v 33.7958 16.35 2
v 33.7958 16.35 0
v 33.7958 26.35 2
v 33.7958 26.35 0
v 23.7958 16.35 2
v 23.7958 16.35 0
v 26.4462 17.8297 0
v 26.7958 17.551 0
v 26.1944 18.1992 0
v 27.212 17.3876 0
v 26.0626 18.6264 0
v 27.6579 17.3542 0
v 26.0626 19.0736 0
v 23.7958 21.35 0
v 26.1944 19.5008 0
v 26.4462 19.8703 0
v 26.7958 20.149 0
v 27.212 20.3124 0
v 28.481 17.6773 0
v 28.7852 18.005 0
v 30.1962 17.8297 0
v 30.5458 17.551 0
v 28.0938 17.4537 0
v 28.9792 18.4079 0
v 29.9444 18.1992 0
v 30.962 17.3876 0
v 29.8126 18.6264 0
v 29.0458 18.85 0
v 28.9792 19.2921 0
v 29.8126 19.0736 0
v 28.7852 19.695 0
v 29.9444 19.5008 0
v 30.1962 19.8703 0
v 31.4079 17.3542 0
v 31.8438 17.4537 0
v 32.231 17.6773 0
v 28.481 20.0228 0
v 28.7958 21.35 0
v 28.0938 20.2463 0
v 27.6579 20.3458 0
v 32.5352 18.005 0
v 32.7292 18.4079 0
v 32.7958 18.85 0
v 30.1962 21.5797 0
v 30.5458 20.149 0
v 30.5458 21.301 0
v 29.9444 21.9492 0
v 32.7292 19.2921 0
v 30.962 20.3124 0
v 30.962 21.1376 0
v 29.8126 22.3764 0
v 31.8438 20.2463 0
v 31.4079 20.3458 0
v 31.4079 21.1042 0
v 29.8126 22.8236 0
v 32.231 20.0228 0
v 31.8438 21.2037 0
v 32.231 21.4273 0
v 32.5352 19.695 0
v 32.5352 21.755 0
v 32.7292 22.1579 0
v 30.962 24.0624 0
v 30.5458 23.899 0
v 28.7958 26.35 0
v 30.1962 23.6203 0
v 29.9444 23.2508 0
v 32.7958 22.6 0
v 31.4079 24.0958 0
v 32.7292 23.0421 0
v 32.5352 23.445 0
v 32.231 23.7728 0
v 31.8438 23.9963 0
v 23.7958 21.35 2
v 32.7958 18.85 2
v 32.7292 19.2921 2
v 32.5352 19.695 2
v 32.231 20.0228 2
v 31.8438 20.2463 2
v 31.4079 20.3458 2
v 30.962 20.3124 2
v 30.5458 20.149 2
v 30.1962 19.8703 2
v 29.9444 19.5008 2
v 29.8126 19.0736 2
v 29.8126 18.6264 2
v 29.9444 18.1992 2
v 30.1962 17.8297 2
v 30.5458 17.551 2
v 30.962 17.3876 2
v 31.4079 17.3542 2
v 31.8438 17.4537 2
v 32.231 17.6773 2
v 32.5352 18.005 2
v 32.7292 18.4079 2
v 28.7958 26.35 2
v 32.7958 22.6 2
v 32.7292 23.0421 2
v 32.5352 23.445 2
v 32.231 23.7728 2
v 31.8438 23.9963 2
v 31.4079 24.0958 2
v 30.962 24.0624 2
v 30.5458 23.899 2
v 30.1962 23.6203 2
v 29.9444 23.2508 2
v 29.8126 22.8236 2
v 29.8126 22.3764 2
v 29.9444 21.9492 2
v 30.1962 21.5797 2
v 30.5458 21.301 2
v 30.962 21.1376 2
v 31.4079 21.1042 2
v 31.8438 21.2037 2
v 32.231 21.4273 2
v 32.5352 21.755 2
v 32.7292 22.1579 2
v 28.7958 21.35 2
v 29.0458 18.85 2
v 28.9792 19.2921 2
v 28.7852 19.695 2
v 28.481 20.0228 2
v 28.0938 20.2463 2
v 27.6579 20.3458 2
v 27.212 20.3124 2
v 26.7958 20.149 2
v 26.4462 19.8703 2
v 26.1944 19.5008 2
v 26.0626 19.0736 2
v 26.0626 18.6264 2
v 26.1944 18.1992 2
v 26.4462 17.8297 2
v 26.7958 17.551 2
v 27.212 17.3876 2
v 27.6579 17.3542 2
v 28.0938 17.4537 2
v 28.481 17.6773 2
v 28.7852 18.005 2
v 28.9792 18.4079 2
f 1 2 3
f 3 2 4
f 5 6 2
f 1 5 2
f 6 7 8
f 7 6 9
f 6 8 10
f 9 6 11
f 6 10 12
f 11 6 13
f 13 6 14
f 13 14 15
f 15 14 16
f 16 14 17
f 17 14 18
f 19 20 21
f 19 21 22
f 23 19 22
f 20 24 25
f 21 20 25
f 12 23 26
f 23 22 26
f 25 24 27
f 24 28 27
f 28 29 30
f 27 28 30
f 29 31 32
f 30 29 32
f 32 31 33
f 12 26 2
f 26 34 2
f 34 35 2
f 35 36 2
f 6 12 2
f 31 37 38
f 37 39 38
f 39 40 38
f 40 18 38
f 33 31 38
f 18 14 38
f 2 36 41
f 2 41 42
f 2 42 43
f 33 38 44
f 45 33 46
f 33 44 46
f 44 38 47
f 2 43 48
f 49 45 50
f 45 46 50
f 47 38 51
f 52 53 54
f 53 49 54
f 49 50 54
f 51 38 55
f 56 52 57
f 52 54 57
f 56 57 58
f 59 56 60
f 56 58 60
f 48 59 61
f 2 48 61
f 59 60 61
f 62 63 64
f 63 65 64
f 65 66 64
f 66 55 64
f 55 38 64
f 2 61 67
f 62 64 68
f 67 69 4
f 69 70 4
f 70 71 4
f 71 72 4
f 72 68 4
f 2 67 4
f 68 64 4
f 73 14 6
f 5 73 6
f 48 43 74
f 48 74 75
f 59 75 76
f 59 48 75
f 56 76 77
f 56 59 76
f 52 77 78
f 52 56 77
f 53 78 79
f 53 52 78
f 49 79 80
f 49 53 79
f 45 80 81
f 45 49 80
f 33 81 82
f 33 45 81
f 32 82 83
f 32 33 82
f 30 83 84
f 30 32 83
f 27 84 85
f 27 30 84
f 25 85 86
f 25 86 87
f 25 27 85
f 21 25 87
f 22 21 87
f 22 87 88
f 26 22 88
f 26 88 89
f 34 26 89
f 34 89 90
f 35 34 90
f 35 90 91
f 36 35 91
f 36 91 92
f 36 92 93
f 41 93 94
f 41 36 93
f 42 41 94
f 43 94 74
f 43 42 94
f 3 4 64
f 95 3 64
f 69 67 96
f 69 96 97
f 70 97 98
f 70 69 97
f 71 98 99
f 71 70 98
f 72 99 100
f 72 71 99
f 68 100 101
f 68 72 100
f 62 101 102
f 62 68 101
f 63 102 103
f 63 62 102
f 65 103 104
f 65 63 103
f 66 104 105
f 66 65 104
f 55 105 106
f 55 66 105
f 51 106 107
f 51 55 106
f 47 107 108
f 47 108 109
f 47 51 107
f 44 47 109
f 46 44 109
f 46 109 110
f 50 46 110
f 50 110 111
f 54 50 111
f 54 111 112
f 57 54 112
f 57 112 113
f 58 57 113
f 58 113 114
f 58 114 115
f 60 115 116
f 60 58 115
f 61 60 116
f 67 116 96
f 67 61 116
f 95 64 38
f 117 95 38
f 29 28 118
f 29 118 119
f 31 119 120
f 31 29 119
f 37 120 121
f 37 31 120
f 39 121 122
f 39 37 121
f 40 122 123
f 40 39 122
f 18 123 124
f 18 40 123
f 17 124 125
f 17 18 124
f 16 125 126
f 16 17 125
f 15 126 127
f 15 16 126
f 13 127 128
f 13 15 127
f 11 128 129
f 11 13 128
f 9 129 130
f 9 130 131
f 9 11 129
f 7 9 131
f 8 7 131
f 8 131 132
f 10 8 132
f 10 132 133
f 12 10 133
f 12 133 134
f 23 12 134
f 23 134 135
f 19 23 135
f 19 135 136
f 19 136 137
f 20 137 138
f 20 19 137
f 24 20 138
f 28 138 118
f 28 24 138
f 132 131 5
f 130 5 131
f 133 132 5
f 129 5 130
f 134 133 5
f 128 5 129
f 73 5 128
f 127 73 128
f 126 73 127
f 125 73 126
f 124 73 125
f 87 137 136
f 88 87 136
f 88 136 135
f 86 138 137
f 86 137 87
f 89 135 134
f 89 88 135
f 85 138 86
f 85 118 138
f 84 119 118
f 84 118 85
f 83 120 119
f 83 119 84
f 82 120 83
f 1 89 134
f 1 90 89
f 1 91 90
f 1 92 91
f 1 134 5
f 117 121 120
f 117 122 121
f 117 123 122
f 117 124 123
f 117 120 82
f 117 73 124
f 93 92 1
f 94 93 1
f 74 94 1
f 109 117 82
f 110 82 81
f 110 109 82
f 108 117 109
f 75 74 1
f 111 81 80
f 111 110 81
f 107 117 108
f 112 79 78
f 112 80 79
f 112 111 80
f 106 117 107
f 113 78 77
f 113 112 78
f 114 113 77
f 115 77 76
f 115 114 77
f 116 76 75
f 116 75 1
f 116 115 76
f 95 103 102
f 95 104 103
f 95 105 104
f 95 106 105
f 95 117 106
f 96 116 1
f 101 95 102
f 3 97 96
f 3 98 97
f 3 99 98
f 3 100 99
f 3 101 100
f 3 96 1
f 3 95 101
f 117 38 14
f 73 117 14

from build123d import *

# Parameters (mm, degrees)
F0_R     = 1.5
F1_DEPTH = 2


with BuildPart() as f1:
    # F0 (on Top) → F1 (new body)
    with BuildSketch(Plane.XY):
        Polygon((23.795815, 21.350004), (23.795815, 16.350004), (33.795815, 16.350004), (33.795815, 21.350004), (33.795815, 26.350004), (28.795815, 26.350004), (28.795815, 21.350004), align=None)
        with Locations((27.545815, 18.850004)):
            Circle(F0_R, mode=Mode.SUBTRACT)
        with Locations((31.295815, 18.850004)):
            Circle(F0_R, mode=Mode.SUBTRACT)
        with Locations((31.295815, 22.600004)):
            Circle(F0_R, mode=Mode.SUBTRACT)
    extrude(amount=F1_DEPTH)


solid = f1.part
